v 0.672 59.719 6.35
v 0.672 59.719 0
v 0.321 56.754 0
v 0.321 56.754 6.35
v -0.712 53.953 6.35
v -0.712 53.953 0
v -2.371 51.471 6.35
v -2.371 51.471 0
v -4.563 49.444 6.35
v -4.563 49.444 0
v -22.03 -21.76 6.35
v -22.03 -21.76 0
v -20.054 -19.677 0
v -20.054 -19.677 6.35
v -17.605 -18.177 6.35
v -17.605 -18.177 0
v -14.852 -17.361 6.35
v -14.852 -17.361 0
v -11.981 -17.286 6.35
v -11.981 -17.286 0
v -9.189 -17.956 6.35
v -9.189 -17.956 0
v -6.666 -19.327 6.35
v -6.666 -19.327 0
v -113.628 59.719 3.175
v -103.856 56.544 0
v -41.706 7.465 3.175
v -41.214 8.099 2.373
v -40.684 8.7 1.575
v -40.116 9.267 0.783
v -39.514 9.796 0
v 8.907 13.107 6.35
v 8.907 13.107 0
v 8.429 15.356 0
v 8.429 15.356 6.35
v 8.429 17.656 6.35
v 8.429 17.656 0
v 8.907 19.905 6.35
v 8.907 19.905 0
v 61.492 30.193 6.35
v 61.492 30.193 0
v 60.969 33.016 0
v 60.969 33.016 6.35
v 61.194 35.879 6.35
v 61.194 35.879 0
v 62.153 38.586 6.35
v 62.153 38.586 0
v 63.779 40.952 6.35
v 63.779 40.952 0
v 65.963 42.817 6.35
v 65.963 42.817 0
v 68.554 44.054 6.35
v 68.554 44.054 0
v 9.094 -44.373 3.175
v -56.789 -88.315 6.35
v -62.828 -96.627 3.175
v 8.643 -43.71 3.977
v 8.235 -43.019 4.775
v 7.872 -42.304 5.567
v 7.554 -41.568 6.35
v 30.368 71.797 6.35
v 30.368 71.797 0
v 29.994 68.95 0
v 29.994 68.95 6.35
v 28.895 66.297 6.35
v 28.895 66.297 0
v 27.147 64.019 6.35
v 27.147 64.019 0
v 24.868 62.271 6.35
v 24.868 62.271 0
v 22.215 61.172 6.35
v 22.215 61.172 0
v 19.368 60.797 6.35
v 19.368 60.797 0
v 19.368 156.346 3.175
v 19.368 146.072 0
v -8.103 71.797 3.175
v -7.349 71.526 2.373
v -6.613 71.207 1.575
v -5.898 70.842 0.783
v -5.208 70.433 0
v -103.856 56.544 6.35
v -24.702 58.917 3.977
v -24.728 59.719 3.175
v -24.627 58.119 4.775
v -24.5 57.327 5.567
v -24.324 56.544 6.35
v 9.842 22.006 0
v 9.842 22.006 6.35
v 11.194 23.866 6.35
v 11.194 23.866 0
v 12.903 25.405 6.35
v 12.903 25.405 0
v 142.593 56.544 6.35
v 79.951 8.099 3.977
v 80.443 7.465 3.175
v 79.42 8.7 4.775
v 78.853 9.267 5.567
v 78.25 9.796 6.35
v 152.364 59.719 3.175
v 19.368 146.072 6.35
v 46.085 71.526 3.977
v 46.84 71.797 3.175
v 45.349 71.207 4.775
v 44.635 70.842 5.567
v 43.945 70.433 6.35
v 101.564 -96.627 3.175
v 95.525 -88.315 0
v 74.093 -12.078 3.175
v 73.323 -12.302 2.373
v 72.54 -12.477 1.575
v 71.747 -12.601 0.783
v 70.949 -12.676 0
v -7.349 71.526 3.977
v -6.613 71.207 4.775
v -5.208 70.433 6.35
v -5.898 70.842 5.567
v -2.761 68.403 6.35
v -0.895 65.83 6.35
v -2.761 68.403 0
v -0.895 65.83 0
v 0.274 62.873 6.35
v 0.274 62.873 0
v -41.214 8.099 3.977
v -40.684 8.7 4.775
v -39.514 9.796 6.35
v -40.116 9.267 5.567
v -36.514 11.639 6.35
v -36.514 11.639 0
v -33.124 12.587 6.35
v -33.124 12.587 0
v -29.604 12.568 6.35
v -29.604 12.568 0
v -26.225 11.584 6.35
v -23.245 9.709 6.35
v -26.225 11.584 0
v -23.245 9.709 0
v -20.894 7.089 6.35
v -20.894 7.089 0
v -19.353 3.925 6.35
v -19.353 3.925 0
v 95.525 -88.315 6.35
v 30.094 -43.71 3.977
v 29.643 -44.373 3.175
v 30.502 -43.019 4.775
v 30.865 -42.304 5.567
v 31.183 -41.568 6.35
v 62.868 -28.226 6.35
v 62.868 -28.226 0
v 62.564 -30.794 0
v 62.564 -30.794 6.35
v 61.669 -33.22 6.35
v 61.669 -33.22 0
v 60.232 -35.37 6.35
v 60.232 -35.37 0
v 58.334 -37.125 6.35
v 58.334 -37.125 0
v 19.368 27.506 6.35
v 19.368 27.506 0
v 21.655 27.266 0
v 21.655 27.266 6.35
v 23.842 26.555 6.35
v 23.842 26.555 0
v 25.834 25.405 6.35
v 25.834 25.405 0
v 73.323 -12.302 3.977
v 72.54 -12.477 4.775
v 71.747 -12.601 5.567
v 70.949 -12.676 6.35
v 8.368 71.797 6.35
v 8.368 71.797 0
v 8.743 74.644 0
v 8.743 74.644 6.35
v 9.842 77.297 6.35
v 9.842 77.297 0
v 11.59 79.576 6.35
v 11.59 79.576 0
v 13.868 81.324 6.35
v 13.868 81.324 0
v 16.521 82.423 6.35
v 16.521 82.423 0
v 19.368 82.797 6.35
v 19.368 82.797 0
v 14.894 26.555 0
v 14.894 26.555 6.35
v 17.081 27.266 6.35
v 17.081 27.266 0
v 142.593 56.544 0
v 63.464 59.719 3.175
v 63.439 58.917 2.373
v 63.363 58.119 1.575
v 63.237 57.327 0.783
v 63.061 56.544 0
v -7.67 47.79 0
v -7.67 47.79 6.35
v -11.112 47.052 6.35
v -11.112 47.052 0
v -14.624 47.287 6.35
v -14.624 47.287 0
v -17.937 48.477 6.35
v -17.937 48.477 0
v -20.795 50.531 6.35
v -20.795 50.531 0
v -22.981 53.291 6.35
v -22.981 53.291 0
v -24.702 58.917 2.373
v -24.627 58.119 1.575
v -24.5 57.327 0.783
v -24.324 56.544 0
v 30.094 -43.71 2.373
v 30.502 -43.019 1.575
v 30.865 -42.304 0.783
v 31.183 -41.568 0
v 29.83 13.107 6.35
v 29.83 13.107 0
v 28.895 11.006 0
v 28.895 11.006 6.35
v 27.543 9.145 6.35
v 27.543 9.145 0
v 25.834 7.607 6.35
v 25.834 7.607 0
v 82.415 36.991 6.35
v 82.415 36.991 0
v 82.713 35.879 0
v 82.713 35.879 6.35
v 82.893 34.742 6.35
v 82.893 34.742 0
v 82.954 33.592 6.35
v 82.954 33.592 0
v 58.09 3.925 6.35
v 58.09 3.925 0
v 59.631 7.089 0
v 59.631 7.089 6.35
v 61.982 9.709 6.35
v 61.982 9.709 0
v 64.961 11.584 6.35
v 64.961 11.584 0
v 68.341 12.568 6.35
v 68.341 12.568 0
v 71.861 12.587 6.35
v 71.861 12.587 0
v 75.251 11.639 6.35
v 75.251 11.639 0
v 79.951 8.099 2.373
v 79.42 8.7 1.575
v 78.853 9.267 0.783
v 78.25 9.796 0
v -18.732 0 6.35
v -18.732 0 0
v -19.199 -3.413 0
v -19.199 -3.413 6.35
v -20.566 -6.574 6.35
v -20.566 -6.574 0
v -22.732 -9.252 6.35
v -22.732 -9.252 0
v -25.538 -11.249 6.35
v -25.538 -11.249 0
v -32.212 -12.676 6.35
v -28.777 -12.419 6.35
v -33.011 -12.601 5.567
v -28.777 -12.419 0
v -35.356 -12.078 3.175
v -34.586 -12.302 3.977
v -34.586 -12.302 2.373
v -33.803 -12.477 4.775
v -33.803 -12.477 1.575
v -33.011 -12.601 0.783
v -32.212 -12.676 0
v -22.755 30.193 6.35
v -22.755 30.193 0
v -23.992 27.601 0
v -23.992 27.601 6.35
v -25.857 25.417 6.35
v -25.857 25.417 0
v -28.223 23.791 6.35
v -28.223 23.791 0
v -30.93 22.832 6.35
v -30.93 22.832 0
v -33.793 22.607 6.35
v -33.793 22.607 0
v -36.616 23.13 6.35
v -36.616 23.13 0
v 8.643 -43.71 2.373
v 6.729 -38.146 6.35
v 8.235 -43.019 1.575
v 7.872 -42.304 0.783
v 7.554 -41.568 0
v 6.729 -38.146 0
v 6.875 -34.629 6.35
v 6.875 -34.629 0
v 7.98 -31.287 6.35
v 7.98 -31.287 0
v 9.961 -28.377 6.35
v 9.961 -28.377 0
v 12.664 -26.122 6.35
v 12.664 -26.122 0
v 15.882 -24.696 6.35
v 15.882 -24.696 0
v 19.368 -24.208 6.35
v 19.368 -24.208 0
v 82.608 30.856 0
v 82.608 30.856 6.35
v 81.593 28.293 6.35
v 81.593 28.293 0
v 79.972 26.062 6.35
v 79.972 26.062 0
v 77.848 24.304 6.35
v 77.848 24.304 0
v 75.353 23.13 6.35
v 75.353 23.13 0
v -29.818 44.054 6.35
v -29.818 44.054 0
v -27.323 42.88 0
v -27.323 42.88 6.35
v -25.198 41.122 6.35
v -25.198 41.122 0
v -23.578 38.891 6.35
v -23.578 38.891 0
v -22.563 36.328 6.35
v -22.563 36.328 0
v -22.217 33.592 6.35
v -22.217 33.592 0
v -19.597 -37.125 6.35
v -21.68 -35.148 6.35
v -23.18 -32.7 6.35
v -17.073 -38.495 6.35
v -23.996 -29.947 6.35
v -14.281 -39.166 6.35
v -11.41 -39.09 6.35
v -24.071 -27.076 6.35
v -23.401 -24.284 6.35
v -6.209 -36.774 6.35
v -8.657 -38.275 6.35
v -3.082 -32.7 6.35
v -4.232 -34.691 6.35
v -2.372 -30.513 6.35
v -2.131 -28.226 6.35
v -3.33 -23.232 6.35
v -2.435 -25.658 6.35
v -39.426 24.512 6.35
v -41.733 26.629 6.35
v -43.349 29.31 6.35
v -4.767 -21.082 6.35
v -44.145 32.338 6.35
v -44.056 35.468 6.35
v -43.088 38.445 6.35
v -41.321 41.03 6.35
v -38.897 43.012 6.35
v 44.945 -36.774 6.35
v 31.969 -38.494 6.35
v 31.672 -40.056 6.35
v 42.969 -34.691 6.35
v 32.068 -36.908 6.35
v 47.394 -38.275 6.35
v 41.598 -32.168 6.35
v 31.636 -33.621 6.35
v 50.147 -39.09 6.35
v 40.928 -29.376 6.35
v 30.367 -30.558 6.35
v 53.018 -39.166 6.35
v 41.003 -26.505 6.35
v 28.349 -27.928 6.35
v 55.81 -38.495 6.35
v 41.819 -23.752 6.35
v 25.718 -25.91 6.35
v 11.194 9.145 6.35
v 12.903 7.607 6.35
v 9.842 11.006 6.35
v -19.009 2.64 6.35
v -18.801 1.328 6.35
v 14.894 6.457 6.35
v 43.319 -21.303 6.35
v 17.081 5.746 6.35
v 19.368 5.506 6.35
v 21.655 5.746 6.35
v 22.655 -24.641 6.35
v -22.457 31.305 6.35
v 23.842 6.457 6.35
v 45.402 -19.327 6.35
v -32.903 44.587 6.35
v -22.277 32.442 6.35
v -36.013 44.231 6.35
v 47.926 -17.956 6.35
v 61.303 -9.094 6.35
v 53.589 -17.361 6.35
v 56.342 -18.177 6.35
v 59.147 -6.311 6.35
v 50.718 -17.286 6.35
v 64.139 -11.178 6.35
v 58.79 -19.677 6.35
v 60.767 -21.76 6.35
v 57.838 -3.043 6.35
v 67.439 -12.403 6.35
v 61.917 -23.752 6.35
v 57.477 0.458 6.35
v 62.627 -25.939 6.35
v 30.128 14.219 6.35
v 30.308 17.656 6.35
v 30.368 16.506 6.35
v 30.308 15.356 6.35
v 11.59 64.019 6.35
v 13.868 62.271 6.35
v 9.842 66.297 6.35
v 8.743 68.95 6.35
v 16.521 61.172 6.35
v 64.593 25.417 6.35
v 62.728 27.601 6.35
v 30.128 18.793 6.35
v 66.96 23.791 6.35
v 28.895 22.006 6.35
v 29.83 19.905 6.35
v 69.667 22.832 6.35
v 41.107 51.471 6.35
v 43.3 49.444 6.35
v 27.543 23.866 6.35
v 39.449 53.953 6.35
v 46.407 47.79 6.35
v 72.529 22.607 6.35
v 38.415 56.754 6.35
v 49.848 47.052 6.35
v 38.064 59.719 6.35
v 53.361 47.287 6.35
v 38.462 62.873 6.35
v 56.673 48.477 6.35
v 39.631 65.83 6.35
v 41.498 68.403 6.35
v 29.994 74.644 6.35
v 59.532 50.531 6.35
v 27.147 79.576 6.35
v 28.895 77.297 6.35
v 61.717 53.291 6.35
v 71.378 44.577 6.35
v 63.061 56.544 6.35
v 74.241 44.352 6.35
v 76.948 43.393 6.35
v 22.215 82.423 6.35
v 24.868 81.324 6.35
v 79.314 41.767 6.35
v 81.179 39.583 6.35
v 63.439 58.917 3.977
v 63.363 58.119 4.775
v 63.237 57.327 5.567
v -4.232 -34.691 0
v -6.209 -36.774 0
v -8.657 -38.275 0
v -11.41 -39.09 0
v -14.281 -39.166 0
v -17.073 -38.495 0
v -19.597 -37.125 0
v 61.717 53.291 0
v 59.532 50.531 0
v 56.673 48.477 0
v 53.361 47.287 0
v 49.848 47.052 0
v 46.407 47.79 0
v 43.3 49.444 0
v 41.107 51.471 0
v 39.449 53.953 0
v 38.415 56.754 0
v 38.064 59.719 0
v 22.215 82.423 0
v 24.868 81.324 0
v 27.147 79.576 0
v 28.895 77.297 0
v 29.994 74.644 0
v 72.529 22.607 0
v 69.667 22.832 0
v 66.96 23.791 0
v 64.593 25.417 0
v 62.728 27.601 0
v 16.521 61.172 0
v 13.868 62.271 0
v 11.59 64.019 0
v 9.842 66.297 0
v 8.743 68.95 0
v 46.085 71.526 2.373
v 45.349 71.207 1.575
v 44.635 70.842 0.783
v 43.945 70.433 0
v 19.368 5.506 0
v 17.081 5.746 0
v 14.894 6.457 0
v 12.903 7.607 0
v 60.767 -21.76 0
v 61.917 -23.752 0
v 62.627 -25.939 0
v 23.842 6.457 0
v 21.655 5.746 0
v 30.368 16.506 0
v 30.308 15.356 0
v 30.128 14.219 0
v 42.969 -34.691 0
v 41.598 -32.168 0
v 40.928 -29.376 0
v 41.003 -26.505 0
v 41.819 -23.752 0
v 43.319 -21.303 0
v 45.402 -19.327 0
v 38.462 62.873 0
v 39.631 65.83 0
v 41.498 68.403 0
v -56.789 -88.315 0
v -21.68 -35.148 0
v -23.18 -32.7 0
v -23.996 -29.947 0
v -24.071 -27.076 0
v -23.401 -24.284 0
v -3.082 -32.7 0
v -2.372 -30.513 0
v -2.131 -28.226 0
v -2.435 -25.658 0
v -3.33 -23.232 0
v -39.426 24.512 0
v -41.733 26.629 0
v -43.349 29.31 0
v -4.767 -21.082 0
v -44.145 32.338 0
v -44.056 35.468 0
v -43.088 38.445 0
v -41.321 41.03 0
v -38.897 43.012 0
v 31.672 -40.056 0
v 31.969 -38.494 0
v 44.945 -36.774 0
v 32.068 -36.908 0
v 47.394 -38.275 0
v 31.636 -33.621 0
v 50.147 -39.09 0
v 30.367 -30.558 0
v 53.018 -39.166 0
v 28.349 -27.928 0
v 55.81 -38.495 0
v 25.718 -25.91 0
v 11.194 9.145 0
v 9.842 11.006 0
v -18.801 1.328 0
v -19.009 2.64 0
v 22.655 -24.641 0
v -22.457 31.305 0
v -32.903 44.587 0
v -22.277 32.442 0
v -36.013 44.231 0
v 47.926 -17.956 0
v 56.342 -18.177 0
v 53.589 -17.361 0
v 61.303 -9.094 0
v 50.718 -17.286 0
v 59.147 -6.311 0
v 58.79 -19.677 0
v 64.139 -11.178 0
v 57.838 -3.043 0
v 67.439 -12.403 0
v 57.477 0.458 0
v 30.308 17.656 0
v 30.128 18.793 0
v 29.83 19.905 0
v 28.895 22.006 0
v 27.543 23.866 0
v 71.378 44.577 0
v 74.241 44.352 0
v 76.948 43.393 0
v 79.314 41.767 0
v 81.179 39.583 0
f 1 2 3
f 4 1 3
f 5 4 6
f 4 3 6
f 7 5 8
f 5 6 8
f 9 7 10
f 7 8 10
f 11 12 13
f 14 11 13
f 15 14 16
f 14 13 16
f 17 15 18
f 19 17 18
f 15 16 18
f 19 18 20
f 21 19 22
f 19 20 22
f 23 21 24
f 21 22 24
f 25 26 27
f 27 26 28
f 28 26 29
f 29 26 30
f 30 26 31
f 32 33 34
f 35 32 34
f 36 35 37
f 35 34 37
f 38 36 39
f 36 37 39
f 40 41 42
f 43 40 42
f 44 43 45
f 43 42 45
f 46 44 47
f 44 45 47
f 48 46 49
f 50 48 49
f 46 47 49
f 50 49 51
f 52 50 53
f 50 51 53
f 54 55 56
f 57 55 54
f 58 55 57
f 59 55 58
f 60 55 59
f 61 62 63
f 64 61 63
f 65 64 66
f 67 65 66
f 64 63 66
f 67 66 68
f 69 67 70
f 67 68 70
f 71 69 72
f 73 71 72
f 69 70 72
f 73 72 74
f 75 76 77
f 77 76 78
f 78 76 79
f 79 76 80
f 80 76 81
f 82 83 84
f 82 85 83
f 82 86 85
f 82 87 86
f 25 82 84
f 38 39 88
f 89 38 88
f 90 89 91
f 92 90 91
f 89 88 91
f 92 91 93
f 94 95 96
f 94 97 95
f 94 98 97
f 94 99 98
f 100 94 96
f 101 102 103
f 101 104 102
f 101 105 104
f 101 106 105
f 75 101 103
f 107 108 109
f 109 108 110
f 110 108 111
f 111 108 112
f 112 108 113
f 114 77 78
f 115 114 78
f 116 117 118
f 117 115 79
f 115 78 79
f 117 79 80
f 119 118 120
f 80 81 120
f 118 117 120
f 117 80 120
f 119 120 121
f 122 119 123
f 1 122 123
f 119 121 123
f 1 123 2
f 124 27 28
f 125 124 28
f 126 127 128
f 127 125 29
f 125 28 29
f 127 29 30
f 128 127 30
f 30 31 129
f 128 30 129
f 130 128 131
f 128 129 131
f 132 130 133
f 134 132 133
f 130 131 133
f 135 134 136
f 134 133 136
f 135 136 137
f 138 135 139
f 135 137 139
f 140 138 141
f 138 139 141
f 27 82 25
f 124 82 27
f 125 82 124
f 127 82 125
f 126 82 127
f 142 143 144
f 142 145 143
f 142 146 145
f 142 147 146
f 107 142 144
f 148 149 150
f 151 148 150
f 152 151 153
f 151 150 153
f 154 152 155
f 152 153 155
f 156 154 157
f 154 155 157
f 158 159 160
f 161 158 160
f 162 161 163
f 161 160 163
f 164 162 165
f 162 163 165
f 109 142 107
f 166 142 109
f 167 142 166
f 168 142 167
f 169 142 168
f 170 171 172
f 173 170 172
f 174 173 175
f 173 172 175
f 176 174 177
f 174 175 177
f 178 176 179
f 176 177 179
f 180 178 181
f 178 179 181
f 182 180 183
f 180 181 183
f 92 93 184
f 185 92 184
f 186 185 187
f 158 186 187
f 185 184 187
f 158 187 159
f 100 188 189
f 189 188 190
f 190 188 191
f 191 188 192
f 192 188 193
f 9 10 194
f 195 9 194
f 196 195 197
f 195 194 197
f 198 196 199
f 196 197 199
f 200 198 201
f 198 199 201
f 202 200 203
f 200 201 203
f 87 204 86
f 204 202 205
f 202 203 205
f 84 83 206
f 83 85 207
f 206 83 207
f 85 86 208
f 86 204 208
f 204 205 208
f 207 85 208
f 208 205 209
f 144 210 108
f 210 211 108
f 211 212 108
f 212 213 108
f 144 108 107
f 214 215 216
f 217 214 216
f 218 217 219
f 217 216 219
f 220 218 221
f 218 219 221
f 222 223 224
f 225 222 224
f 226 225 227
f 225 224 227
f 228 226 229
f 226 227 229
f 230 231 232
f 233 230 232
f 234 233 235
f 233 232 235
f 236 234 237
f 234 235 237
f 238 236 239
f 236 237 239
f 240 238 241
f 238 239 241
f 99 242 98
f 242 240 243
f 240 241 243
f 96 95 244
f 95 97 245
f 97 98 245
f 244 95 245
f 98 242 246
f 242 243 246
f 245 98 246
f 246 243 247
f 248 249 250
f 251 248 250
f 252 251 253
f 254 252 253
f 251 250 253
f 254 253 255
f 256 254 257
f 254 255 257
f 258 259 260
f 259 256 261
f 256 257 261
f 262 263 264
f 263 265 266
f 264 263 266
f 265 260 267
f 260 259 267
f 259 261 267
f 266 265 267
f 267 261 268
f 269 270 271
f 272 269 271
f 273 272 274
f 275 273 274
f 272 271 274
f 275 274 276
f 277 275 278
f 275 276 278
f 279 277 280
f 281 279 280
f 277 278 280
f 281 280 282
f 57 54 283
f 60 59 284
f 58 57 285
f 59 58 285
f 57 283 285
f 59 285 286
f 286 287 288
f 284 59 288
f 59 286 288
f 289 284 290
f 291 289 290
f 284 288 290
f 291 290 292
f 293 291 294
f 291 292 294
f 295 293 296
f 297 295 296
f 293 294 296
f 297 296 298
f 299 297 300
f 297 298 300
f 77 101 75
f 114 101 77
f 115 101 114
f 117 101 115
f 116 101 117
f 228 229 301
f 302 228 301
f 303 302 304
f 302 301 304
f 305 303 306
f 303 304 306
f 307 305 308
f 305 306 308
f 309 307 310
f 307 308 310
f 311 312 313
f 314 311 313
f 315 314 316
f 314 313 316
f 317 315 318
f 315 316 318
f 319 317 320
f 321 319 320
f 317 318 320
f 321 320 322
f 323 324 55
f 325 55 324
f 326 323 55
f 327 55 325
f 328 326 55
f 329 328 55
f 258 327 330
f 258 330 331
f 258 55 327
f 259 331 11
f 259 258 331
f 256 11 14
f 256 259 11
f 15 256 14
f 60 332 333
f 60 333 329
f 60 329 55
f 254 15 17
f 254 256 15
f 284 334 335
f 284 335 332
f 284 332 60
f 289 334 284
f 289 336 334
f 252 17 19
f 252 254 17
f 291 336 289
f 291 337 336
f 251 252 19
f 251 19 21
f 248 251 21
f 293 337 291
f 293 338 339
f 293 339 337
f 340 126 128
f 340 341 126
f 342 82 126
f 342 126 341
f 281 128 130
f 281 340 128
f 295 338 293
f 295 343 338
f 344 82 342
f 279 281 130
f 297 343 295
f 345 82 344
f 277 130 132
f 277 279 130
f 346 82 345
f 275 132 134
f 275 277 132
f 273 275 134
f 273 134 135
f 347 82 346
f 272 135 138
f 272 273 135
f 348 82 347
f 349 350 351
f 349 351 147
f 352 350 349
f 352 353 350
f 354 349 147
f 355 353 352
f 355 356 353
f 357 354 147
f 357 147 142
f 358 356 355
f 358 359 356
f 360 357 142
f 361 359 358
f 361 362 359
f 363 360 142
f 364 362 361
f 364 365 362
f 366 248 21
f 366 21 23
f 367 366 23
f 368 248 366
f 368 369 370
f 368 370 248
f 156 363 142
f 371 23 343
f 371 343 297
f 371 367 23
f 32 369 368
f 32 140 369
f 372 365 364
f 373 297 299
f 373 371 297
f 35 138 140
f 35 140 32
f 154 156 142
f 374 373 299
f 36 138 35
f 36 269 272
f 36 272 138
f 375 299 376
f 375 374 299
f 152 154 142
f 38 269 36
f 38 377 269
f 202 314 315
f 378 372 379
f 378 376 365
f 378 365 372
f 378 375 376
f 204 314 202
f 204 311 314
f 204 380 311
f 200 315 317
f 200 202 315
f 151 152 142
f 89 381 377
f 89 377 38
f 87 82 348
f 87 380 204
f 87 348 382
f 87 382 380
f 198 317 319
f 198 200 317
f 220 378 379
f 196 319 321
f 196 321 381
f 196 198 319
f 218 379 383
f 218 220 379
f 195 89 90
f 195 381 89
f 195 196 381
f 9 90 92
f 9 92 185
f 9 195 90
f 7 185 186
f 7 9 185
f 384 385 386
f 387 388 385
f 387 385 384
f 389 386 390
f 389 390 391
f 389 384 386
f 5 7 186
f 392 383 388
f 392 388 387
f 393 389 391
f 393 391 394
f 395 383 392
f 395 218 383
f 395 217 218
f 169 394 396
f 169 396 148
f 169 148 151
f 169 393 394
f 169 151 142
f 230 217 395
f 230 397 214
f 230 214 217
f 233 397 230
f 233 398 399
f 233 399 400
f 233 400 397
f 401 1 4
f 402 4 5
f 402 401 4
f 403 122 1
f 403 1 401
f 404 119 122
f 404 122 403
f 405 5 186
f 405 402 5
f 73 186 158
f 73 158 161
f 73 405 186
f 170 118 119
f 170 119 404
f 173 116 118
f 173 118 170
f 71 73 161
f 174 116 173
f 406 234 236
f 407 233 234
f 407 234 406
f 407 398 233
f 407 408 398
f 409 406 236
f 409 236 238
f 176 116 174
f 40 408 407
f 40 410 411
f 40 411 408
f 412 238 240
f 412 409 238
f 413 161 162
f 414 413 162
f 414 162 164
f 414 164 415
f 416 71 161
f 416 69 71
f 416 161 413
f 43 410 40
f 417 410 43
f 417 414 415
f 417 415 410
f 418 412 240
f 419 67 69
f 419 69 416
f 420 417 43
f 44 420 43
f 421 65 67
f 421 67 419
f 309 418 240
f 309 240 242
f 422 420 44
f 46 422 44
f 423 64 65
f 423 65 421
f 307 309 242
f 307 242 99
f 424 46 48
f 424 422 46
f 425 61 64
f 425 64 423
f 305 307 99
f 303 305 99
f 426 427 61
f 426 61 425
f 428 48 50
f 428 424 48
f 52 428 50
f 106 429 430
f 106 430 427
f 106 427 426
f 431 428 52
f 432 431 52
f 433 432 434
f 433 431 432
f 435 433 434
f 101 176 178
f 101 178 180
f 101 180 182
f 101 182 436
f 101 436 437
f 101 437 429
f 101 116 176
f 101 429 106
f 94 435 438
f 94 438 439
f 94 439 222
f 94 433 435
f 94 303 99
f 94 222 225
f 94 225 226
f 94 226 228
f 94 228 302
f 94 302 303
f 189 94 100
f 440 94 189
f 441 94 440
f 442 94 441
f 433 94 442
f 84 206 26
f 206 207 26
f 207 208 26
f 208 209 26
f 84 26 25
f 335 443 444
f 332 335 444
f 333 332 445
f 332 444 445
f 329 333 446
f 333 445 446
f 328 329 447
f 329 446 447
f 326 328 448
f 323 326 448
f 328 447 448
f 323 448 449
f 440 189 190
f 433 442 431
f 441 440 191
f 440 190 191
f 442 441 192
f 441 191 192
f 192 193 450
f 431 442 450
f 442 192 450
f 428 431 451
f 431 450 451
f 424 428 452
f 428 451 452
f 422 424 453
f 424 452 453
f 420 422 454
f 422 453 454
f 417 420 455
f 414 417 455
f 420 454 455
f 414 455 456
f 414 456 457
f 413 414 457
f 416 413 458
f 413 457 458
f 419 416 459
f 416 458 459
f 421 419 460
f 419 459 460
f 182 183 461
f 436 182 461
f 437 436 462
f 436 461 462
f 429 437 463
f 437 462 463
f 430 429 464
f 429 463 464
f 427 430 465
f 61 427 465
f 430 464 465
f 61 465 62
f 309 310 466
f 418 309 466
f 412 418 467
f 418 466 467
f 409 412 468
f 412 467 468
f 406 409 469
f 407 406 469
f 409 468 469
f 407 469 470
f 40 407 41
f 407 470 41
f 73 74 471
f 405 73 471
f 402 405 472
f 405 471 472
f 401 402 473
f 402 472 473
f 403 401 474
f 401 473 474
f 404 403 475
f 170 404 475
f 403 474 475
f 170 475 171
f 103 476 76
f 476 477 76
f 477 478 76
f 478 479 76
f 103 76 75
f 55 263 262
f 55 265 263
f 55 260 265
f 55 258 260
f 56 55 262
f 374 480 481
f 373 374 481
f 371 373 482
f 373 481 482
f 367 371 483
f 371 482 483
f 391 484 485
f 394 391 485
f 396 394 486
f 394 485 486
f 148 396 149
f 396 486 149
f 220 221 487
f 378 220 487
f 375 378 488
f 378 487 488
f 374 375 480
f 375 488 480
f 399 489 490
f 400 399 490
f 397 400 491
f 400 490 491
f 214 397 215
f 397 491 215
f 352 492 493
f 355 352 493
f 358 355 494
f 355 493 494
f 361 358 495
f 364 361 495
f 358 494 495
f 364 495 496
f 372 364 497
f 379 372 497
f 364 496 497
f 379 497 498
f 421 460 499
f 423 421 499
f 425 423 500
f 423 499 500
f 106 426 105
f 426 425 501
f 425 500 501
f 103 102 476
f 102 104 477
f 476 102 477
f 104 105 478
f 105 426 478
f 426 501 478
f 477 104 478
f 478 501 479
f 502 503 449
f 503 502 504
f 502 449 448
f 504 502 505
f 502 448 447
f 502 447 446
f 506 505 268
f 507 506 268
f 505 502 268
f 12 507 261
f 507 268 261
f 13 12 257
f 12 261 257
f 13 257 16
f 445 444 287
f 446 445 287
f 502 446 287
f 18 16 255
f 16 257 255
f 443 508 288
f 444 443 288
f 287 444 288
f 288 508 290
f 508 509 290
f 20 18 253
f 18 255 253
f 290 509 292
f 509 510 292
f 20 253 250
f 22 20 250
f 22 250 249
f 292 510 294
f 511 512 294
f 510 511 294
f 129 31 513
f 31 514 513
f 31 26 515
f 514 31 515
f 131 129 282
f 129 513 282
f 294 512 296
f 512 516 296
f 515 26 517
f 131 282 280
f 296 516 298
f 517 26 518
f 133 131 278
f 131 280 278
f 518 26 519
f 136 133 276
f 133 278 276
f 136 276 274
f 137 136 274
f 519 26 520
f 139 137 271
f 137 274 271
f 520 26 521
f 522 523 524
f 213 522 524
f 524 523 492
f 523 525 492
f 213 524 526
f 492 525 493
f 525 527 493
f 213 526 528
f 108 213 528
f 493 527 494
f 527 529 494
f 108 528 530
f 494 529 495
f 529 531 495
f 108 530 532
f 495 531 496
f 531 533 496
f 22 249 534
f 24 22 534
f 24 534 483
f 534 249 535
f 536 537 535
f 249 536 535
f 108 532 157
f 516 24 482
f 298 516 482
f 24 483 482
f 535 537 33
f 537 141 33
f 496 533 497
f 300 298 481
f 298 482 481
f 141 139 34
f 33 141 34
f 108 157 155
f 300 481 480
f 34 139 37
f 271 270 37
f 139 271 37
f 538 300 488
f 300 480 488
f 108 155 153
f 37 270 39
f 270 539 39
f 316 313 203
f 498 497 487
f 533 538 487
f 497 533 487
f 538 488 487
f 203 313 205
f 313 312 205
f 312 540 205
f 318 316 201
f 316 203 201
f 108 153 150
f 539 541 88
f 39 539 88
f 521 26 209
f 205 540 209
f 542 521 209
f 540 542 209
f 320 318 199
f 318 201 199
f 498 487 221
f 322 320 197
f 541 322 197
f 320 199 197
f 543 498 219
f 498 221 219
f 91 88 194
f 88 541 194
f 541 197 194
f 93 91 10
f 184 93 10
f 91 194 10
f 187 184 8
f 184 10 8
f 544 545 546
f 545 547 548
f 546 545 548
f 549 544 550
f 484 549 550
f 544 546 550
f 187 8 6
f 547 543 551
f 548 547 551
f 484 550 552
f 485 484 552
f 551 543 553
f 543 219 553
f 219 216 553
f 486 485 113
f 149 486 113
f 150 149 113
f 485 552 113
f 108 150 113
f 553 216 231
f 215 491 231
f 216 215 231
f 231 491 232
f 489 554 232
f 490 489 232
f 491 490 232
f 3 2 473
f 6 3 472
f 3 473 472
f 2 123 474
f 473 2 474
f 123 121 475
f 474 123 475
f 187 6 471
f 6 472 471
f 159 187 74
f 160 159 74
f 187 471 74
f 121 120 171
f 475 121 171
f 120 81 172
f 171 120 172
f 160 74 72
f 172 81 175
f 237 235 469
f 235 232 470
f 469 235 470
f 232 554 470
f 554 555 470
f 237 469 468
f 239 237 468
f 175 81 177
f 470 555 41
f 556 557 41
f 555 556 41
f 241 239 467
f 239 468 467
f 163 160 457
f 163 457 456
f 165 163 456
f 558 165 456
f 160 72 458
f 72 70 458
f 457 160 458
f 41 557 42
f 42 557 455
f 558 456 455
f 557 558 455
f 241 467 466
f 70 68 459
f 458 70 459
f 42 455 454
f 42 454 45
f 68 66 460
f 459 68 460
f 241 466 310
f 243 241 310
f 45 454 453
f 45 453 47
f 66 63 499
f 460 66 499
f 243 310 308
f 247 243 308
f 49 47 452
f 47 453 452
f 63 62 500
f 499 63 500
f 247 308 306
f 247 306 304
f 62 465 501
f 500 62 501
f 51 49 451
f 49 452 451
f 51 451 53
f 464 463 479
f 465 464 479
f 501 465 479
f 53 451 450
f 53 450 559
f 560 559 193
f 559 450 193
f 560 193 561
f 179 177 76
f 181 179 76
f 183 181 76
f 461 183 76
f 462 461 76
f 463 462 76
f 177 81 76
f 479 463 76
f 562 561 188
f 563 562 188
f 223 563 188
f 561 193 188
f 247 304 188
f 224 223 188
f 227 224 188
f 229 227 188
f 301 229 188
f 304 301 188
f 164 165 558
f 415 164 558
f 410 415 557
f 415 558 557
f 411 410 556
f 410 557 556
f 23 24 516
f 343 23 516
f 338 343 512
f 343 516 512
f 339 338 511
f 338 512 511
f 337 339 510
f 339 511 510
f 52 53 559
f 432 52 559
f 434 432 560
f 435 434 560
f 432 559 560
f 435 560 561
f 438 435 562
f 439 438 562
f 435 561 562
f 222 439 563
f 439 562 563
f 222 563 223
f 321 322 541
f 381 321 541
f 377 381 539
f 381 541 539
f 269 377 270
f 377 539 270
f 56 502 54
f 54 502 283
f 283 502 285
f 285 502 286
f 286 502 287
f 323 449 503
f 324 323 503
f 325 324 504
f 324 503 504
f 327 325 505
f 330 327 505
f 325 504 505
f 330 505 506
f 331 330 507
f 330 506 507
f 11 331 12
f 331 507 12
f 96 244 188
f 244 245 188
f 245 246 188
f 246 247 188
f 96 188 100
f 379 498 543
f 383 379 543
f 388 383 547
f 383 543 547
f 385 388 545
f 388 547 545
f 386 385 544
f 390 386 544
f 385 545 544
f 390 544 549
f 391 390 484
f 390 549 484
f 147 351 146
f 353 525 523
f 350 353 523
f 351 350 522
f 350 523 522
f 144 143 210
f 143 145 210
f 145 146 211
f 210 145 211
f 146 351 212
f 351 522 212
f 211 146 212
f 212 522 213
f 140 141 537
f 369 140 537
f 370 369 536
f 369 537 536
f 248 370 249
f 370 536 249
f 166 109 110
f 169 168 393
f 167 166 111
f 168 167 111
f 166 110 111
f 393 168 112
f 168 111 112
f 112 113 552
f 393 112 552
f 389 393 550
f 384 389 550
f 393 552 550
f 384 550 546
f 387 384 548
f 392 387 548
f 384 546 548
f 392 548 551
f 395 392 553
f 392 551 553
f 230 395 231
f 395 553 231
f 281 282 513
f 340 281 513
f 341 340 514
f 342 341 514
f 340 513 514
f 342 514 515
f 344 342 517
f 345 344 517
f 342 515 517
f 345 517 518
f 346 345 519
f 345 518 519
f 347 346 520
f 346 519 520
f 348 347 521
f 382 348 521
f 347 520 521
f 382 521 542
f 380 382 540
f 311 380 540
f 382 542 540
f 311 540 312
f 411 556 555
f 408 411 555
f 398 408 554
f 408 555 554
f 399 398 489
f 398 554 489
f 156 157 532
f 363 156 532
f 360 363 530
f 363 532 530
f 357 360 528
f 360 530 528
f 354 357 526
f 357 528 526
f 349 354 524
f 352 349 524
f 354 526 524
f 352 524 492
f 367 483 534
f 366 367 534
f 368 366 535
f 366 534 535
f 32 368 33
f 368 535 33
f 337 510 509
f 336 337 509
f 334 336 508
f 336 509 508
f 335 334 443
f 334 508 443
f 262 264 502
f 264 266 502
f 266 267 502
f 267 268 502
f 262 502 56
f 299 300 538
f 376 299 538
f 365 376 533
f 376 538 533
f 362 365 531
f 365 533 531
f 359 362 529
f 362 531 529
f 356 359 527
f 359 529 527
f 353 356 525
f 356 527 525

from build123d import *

# Parameters (mm, degrees)
F1_DEPTH = 6.35
F2_SIZE  = 3.17499


# Not quite as in the source:
# - a fillet or chamfer is up to 0.001 mm smaller than in the source, because OpenCascade refuses the exact size
# - a feature names something its author has since deleted; it is built from what else it names


with BuildPart() as f1:
    # F0 (on Top) → F1 (new body)
    with BuildSketch(Plane.XY):
        with BuildLine():
            Line((19.3683549781, 156.3463236885), (-8.1032558219, 71.7973993899))
            Line((-8.1032558219, 71.7973993899), (8.3683549781, 71.7973993899))
            ThreePointArc((8.3683549781, 71.7973993899), (11.590180385, 79.5755739829), (19.3683549781, 82.7973993899))
            Line((19.3683549781, 82.7973993899), (19.3683549781, 156.3463236885))
        make_face()
        with BuildLine():
            Line((19.3683549781, 60.7973993899), (19.3683549781, 59.7189816329))
            Line((19.3683549781, 59.7189816329), (38.0644816066, 59.7189816329))
            ThreePointArc((38.0644816066, 59.7189816329), (40.489965778, 67.183854337), (46.839965778, 71.7973993899))
            Line((46.839965778, 71.7973993899), (30.3683549781, 71.7973993899))
            ThreePointArc((30.3683549781, 71.7973993899), (27.1465295711, 64.0192247968), (19.3683549781, 60.7973993899))
        make_face()
        with BuildLine():
            Line((19.3683549781, 59.7189816329), (0.6722283496, 59.7189816329))
            ThreePointArc((0.6722283496, 59.7189816329), (-0.7119887932, 53.9533022862), (-4.5628989463, 49.4444658044))
            Line((-4.5628989463, 49.4444658044), (12.9027172029, 25.4051075068))
            ThreePointArc((12.9027172029, 25.4051075068), (15.96916804, 26.9675422479), (19.3683549781, 27.5059205686))
            Line((19.3683549781, 27.5059205686), (19.3683549781, 59.7189816329))
        make_face()
        with BuildLine():
            ThreePointArc((-4.5628989463, 49.4444658044), (-17.7934509971, 48.4031987757), (-24.7277716504, 59.7189816329))
            Line((-24.7277716504, 59.7189816329), (-29.8177793123, 44.0535488478))
            ThreePointArc((-29.8177793123, 44.0535488478), (-24.3177793123, 40.0575649437), (-22.2169662504, 33.5919271685))
            ThreePointArc((-22.2169662504, 33.5919271685), (-22.3523945039, 31.8711480531), (-22.7553445712, 30.1927402304))
            Line((-22.7553445712, 30.1927402304), (8.9067332988, 19.9051075068))
            ThreePointArc((8.9067332988, 19.9051075068), (10.46916804, 22.9715583438), (12.9027172029, 25.4051075068))
            Line((12.9027172029, 25.4051075068), (-4.5628989463, 49.4444658044))
        make_face()
        with BuildLine():
            Line((-36.6161531886, 23.1303054893), (-41.7061608505, 7.4648727041))
            ThreePointArc((-41.7061608505, 7.4648727041), (-29.4449273159, 12.5436419256), (-19.353227265, 3.9245158286))
            Line((-19.353227265, 3.9245158286), (8.9067332988, 13.1067336305))
            ThreePointArc((8.9067332988, 13.1067336305), (8.3683549781, 16.5059205686), (8.9067332988, 19.9051075068))
            Line((8.9067332988, 19.9051075068), (-22.7553445712, 30.1927402304))
            ThreePointArc((-22.7553445712, 30.1927402304), (-28.2230707533, 23.7908554024), (-36.6161531886, 23.1303054893))
        make_face()
        with BuildLine():
            ThreePointArc((-18.7316450219, 0), (-23.9667723178, -10.2745158286), (-35.3561608505, -12.0784177569))
            Line((-35.3561608505, -12.0784177569), (-22.0303477886, -21.7601876667))
            ThreePointArc((-22.0303477886, -21.7601876667), (-14.8519399659, -17.3612536953), (-6.6655230753, -19.3266385037))
            Line((-6.6655230753, -19.3266385037), (12.9027172029, 7.6067336305))
            ThreePointArc((12.9027172029, 7.6067336305), (10.46916804, 10.0402827934), (8.9067332988, 13.1067336305))
            Line((8.9067332988, 13.1067336305), (-19.353227265, 3.9245158286))
            ThreePointArc((-19.353227265, 3.9245158286), (-18.8880030964, 1.986717706), (-18.7316450219, 0))
        make_face()
        with BuildLine():
            ThreePointArc((19.3683549781, 5.5059205686), (15.96916804, 6.0442988894), (12.9027172029, 7.6067336305))
            Line((12.9027172029, 7.6067336305), (-6.6655230753, -19.3266385037))
            ThreePointArc((-6.6655230753, -19.3266385037), (-3.3300890844, -23.2319299447), (-2.1311608505, -28.2258254419))
            ThreePointArc((-2.1311608505, -28.2258254419), (-2.6695391712, -31.62501238), (-4.2319739124, -34.6914632171))
            Line((-4.2319739124, -34.6914632171), (9.0938391495, -44.3732331268))
            ThreePointArc((9.0938391495, -44.3732331268), (8.0525721209, -31.142681076), (19.3683549781, -24.2083604227))
            Line((19.3683549781, -24.2083604227), (19.3683549781, 5.5059205686))
        make_face()
        with BuildLine():
            Line((45.4022330314, -19.3266385037), (25.8339927533, 7.6067336305))
            ThreePointArc((25.8339927533, 7.6067336305), (22.7675419162, 6.0442988894), (19.3683549781, 5.5059205686))
            Line((19.3683549781, 5.5059205686), (19.3683549781, -24.2083604227))
            ThreePointArc((19.3683549781, -24.2083604227), (28.3486110991, -27.9281043016), (32.0683549781, -36.9083604227))
            ThreePointArc((32.0683549781, -36.9083604227), (31.446772735, -40.8328762512), (29.6428708066, -44.3732331268))
            Line((29.6428708066, -44.3732331268), (42.9686838685, -34.6914632171))
            ThreePointArc((42.9686838685, -34.6914632171), (41.0032990601, -26.5050463264), (45.4022330314, -19.3266385037))
        make_face()
        with BuildLine():
            ThreePointArc((29.8299766573, 13.1067336305), (28.2675419162, 10.0402827934), (25.8339927533, 7.6067336305))
            Line((25.8339927533, 7.6067336305), (45.4022330314, -19.3266385037))
            ThreePointArc((45.4022330314, -19.3266385037), (53.5886499221, -17.3612536953), (60.7670577448, -21.7601876667))
            Line((60.7670577448, -21.7601876667), (74.0928708066, -12.0784177569))
            ThreePointArc((74.0928708066, -12.0784177569), (61.188098857, -8.9802561211), (58.0899372211, 3.9245158286))
            Line((58.0899372211, 3.9245158286), (29.8299766573, 13.1067336305))
        make_face()
        with BuildLine():
            Line((61.4920545274, 30.1927402304), (29.8299766573, 19.9051075068))
            ThreePointArc((29.8299766573, 19.9051075068), (30.2329267246, 18.2266996841), (30.3683549781, 16.5059205686))
            ThreePointArc((30.3683549781, 16.5059205686), (30.2329267246, 14.7851414532), (29.8299766573, 13.1067336305))
            Line((29.8299766573, 13.1067336305), (58.0899372211, 3.9245158286))
            ThreePointArc((58.0899372211, 3.9245158286), (68.1816372721, 12.5436419256), (80.4428708066, 7.4648727041))
            Line((80.4428708066, 7.4648727041), (75.3528631447, 23.1303054893))
            ThreePointArc((75.3528631447, 23.1303054893), (66.9597807095, 23.7908554024), (61.4920545274, 30.1927402304))
        make_face()
        with BuildLine():
            Line((68.5544892685, 44.0535488478), (63.4644816066, 59.7189816329))
            ThreePointArc((63.4644816066, 59.7189816329), (56.5301609533, 48.4031987757), (43.2996089025, 49.4444658044))
            Line((43.2996089025, 49.4444658044), (25.8339927533, 25.4051075068))
            ThreePointArc((25.8339927533, 25.4051075068), (28.2675419162, 22.9715583438), (29.8299766573, 19.9051075068))
            Line((29.8299766573, 19.9051075068), (61.4920545274, 30.1927402304))
            ThreePointArc((61.4920545274, 30.1927402304), (62.1526044405, 38.5858226656), (68.5544892685, 44.0535488478))
        make_face()
        with BuildLine():
            Line((8.3683549781, 71.7973993899), (-8.1032558219, 71.7973993899))
            ThreePointArc((-8.1032558219, 71.7973993899), (-1.7532558219, 67.183854337), (0.6722283496, 59.7189816329))
            Line((0.6722283496, 59.7189816329), (19.3683549781, 59.7189816329))
            Line((19.3683549781, 59.7189816329), (19.3683549781, 60.7973993899))
            ThreePointArc((19.3683549781, 60.7973993899), (11.590180385, 64.0192247968), (8.3683549781, 71.7973993899))
        make_face()
        with BuildLine():
            Line((46.839965778, 71.7973993899), (19.3683549781, 156.3463236885))
            Line((19.3683549781, 156.3463236885), (19.3683549781, 82.7973993899))
            ThreePointArc((19.3683549781, 82.7973993899), (27.1465295711, 79.5755739829), (30.3683549781, 71.7973993899))
            Line((30.3683549781, 71.7973993899), (46.839965778, 71.7973993899))
        make_face()
        with BuildLine():
            Line((38.0644816066, 59.7189816329), (19.3683549781, 59.7189816329))
            Line((19.3683549781, 59.7189816329), (19.3683549781, 27.5059205686))
            ThreePointArc((19.3683549781, 27.5059205686), (22.7675419162, 26.9675422479), (25.8339927533, 25.4051075068))
            Line((25.8339927533, 25.4051075068), (43.2996089025, 49.4444658044))
            ThreePointArc((43.2996089025, 49.4444658044), (39.4486987494, 53.9533022862), (38.0644816066, 59.7189816329))
        make_face()
        with BuildLine():
            Line((-29.8177793123, 44.0535488478), (-24.7277716504, 59.7189816329))
            Line((-24.7277716504, 59.7189816329), (-113.6277716504, 59.7189816329))
            Line((-113.6277716504, 59.7189816329), (-43.6785879297, 36.9911141066))
            ThreePointArc((-43.6785879297, 36.9911141066), (-38.2108617476, 43.3929989346), (-29.8177793123, 44.0535488478))
        make_face()
        with BuildLine():
            Line((-43.6785879297, 36.9911141066), (-113.6277716504, 59.7189816329))
            Line((-113.6277716504, 59.7189816329), (-41.7061608505, 7.4648727041))
            Line((-41.7061608505, 7.4648727041), (-36.6161531886, 23.1303054893))
            ThreePointArc((-36.6161531886, 23.1303054893), (-43.0180380165, 28.5980316714), (-43.6785879297, 36.9911141066))
        make_face()
        with BuildLine():
            Line((-22.0303477886, -21.7601876667), (-35.3561608505, -12.0784177569))
            Line((-35.3561608505, -12.0784177569), (-62.8277716504, -96.6273420556))
            Line((-62.8277716504, -96.6273420556), (-19.5967986257, -37.12501238))
            ThreePointArc((-19.5967986257, -37.12501238), (-23.995732597, -29.9466045573), (-22.0303477886, -21.7601876667))
        make_face()
        with BuildLine():
            Line((-19.5967986257, -37.12501238), (-62.8277716504, -96.6273420556))
            Line((-62.8277716504, -96.6273420556), (9.0938391495, -44.3732331268))
            Line((9.0938391495, -44.3732331268), (-4.2319739124, -34.6914632171))
            ThreePointArc((-4.2319739124, -34.6914632171), (-11.410381735, -39.0903971884), (-19.5967986257, -37.12501238))
        make_face()
        with BuildLine():
            ThreePointArc((58.3335085819, -37.12501238), (50.1470916912, -39.0903971884), (42.9686838685, -34.6914632171))
            Line((42.9686838685, -34.6914632171), (29.6428708066, -44.3732331268))
            Line((29.6428708066, -44.3732331268), (101.5644816066, -96.6273420556))
            Line((101.5644816066, -96.6273420556), (58.3335085819, -37.12501238))
        make_face()
        with BuildLine():
            Line((74.0928708066, -12.0784177569), (60.7670577448, -21.7601876667))
            ThreePointArc((60.7670577448, -21.7601876667), (62.3294924859, -24.8266385037), (62.8678708066, -28.2258254419))
            ThreePointArc((62.8678708066, -28.2258254419), (61.6689425727, -33.219720939), (58.3335085819, -37.12501238))
            Line((58.3335085819, -37.12501238), (101.5644816066, -96.6273420556))
            Line((101.5644816066, -96.6273420556), (74.0928708066, -12.0784177569))
        make_face()
        with BuildLine():
            Line((80.4428708066, 7.4648727041), (152.3644816066, 59.7189816329))
            Line((152.3644816066, 59.7189816329), (82.4152978859, 36.9911141066))
            ThreePointArc((82.4152978859, 36.9911141066), (82.8182479532, 35.312706284), (82.9536762066, 33.5919271685))
            ThreePointArc((82.9536762066, 33.5919271685), (80.8528631447, 27.1262893933), (75.3528631447, 23.1303054893))
            Line((75.3528631447, 23.1303054893), (80.4428708066, 7.4648727041))
        make_face()
        with BuildLine():
            Line((152.3644816066, 59.7189816329), (63.4644816066, 59.7189816329))
            Line((63.4644816066, 59.7189816329), (68.5544892685, 44.0535488478))
            ThreePointArc((68.5544892685, 44.0535488478), (76.9475717037, 43.3929989346), (82.4152978859, 36.9911141066))
            Line((82.4152978859, 36.9911141066), (152.3644816066, 59.7189816329))
        make_face()
    extrude(amount=F1_DEPTH)

    # F2 (size 3.175 in the source; OpenCascade refuses exactly that, so slightly less here)
    f2_edges = [f1.edges().sort_by_distance(p)[0] for p in [
        (-77.666966, 33.591927, 6.35),
        (-69.177772, 59.718982, 6.35),
        (5.63255, 114.071862, 6.35),
        (33.10416, 114.071862, 6.35),
        (107.914482, 59.718982, 6.35),
        (116.403676, 33.591927, 6.35),
        (87.828676, -54.35288, 6.35),
        (65.603676, -70.500288, 6.35),
        (-26.866966, -70.500288, 6.35),
        (-49.091966, -54.35288, 6.35),
        (-26.866966, -70.500288, 0),
        (-49.091966, -54.35288, 0),
        (65.603676, -70.500288, 0),
        (87.828676, -54.35288, 0),
        (116.403676, 33.591927, 0),
        (107.914482, 59.718982, 0),
        (33.10416, 114.071862, 0),
        (5.63255, 114.071862, 0),
        (-69.177772, 59.718982, 0),
        (-77.666966, 33.591927, 0),
    ]]
    chamfer(f2_edges, length=F2_SIZE)


solid = f1.part
